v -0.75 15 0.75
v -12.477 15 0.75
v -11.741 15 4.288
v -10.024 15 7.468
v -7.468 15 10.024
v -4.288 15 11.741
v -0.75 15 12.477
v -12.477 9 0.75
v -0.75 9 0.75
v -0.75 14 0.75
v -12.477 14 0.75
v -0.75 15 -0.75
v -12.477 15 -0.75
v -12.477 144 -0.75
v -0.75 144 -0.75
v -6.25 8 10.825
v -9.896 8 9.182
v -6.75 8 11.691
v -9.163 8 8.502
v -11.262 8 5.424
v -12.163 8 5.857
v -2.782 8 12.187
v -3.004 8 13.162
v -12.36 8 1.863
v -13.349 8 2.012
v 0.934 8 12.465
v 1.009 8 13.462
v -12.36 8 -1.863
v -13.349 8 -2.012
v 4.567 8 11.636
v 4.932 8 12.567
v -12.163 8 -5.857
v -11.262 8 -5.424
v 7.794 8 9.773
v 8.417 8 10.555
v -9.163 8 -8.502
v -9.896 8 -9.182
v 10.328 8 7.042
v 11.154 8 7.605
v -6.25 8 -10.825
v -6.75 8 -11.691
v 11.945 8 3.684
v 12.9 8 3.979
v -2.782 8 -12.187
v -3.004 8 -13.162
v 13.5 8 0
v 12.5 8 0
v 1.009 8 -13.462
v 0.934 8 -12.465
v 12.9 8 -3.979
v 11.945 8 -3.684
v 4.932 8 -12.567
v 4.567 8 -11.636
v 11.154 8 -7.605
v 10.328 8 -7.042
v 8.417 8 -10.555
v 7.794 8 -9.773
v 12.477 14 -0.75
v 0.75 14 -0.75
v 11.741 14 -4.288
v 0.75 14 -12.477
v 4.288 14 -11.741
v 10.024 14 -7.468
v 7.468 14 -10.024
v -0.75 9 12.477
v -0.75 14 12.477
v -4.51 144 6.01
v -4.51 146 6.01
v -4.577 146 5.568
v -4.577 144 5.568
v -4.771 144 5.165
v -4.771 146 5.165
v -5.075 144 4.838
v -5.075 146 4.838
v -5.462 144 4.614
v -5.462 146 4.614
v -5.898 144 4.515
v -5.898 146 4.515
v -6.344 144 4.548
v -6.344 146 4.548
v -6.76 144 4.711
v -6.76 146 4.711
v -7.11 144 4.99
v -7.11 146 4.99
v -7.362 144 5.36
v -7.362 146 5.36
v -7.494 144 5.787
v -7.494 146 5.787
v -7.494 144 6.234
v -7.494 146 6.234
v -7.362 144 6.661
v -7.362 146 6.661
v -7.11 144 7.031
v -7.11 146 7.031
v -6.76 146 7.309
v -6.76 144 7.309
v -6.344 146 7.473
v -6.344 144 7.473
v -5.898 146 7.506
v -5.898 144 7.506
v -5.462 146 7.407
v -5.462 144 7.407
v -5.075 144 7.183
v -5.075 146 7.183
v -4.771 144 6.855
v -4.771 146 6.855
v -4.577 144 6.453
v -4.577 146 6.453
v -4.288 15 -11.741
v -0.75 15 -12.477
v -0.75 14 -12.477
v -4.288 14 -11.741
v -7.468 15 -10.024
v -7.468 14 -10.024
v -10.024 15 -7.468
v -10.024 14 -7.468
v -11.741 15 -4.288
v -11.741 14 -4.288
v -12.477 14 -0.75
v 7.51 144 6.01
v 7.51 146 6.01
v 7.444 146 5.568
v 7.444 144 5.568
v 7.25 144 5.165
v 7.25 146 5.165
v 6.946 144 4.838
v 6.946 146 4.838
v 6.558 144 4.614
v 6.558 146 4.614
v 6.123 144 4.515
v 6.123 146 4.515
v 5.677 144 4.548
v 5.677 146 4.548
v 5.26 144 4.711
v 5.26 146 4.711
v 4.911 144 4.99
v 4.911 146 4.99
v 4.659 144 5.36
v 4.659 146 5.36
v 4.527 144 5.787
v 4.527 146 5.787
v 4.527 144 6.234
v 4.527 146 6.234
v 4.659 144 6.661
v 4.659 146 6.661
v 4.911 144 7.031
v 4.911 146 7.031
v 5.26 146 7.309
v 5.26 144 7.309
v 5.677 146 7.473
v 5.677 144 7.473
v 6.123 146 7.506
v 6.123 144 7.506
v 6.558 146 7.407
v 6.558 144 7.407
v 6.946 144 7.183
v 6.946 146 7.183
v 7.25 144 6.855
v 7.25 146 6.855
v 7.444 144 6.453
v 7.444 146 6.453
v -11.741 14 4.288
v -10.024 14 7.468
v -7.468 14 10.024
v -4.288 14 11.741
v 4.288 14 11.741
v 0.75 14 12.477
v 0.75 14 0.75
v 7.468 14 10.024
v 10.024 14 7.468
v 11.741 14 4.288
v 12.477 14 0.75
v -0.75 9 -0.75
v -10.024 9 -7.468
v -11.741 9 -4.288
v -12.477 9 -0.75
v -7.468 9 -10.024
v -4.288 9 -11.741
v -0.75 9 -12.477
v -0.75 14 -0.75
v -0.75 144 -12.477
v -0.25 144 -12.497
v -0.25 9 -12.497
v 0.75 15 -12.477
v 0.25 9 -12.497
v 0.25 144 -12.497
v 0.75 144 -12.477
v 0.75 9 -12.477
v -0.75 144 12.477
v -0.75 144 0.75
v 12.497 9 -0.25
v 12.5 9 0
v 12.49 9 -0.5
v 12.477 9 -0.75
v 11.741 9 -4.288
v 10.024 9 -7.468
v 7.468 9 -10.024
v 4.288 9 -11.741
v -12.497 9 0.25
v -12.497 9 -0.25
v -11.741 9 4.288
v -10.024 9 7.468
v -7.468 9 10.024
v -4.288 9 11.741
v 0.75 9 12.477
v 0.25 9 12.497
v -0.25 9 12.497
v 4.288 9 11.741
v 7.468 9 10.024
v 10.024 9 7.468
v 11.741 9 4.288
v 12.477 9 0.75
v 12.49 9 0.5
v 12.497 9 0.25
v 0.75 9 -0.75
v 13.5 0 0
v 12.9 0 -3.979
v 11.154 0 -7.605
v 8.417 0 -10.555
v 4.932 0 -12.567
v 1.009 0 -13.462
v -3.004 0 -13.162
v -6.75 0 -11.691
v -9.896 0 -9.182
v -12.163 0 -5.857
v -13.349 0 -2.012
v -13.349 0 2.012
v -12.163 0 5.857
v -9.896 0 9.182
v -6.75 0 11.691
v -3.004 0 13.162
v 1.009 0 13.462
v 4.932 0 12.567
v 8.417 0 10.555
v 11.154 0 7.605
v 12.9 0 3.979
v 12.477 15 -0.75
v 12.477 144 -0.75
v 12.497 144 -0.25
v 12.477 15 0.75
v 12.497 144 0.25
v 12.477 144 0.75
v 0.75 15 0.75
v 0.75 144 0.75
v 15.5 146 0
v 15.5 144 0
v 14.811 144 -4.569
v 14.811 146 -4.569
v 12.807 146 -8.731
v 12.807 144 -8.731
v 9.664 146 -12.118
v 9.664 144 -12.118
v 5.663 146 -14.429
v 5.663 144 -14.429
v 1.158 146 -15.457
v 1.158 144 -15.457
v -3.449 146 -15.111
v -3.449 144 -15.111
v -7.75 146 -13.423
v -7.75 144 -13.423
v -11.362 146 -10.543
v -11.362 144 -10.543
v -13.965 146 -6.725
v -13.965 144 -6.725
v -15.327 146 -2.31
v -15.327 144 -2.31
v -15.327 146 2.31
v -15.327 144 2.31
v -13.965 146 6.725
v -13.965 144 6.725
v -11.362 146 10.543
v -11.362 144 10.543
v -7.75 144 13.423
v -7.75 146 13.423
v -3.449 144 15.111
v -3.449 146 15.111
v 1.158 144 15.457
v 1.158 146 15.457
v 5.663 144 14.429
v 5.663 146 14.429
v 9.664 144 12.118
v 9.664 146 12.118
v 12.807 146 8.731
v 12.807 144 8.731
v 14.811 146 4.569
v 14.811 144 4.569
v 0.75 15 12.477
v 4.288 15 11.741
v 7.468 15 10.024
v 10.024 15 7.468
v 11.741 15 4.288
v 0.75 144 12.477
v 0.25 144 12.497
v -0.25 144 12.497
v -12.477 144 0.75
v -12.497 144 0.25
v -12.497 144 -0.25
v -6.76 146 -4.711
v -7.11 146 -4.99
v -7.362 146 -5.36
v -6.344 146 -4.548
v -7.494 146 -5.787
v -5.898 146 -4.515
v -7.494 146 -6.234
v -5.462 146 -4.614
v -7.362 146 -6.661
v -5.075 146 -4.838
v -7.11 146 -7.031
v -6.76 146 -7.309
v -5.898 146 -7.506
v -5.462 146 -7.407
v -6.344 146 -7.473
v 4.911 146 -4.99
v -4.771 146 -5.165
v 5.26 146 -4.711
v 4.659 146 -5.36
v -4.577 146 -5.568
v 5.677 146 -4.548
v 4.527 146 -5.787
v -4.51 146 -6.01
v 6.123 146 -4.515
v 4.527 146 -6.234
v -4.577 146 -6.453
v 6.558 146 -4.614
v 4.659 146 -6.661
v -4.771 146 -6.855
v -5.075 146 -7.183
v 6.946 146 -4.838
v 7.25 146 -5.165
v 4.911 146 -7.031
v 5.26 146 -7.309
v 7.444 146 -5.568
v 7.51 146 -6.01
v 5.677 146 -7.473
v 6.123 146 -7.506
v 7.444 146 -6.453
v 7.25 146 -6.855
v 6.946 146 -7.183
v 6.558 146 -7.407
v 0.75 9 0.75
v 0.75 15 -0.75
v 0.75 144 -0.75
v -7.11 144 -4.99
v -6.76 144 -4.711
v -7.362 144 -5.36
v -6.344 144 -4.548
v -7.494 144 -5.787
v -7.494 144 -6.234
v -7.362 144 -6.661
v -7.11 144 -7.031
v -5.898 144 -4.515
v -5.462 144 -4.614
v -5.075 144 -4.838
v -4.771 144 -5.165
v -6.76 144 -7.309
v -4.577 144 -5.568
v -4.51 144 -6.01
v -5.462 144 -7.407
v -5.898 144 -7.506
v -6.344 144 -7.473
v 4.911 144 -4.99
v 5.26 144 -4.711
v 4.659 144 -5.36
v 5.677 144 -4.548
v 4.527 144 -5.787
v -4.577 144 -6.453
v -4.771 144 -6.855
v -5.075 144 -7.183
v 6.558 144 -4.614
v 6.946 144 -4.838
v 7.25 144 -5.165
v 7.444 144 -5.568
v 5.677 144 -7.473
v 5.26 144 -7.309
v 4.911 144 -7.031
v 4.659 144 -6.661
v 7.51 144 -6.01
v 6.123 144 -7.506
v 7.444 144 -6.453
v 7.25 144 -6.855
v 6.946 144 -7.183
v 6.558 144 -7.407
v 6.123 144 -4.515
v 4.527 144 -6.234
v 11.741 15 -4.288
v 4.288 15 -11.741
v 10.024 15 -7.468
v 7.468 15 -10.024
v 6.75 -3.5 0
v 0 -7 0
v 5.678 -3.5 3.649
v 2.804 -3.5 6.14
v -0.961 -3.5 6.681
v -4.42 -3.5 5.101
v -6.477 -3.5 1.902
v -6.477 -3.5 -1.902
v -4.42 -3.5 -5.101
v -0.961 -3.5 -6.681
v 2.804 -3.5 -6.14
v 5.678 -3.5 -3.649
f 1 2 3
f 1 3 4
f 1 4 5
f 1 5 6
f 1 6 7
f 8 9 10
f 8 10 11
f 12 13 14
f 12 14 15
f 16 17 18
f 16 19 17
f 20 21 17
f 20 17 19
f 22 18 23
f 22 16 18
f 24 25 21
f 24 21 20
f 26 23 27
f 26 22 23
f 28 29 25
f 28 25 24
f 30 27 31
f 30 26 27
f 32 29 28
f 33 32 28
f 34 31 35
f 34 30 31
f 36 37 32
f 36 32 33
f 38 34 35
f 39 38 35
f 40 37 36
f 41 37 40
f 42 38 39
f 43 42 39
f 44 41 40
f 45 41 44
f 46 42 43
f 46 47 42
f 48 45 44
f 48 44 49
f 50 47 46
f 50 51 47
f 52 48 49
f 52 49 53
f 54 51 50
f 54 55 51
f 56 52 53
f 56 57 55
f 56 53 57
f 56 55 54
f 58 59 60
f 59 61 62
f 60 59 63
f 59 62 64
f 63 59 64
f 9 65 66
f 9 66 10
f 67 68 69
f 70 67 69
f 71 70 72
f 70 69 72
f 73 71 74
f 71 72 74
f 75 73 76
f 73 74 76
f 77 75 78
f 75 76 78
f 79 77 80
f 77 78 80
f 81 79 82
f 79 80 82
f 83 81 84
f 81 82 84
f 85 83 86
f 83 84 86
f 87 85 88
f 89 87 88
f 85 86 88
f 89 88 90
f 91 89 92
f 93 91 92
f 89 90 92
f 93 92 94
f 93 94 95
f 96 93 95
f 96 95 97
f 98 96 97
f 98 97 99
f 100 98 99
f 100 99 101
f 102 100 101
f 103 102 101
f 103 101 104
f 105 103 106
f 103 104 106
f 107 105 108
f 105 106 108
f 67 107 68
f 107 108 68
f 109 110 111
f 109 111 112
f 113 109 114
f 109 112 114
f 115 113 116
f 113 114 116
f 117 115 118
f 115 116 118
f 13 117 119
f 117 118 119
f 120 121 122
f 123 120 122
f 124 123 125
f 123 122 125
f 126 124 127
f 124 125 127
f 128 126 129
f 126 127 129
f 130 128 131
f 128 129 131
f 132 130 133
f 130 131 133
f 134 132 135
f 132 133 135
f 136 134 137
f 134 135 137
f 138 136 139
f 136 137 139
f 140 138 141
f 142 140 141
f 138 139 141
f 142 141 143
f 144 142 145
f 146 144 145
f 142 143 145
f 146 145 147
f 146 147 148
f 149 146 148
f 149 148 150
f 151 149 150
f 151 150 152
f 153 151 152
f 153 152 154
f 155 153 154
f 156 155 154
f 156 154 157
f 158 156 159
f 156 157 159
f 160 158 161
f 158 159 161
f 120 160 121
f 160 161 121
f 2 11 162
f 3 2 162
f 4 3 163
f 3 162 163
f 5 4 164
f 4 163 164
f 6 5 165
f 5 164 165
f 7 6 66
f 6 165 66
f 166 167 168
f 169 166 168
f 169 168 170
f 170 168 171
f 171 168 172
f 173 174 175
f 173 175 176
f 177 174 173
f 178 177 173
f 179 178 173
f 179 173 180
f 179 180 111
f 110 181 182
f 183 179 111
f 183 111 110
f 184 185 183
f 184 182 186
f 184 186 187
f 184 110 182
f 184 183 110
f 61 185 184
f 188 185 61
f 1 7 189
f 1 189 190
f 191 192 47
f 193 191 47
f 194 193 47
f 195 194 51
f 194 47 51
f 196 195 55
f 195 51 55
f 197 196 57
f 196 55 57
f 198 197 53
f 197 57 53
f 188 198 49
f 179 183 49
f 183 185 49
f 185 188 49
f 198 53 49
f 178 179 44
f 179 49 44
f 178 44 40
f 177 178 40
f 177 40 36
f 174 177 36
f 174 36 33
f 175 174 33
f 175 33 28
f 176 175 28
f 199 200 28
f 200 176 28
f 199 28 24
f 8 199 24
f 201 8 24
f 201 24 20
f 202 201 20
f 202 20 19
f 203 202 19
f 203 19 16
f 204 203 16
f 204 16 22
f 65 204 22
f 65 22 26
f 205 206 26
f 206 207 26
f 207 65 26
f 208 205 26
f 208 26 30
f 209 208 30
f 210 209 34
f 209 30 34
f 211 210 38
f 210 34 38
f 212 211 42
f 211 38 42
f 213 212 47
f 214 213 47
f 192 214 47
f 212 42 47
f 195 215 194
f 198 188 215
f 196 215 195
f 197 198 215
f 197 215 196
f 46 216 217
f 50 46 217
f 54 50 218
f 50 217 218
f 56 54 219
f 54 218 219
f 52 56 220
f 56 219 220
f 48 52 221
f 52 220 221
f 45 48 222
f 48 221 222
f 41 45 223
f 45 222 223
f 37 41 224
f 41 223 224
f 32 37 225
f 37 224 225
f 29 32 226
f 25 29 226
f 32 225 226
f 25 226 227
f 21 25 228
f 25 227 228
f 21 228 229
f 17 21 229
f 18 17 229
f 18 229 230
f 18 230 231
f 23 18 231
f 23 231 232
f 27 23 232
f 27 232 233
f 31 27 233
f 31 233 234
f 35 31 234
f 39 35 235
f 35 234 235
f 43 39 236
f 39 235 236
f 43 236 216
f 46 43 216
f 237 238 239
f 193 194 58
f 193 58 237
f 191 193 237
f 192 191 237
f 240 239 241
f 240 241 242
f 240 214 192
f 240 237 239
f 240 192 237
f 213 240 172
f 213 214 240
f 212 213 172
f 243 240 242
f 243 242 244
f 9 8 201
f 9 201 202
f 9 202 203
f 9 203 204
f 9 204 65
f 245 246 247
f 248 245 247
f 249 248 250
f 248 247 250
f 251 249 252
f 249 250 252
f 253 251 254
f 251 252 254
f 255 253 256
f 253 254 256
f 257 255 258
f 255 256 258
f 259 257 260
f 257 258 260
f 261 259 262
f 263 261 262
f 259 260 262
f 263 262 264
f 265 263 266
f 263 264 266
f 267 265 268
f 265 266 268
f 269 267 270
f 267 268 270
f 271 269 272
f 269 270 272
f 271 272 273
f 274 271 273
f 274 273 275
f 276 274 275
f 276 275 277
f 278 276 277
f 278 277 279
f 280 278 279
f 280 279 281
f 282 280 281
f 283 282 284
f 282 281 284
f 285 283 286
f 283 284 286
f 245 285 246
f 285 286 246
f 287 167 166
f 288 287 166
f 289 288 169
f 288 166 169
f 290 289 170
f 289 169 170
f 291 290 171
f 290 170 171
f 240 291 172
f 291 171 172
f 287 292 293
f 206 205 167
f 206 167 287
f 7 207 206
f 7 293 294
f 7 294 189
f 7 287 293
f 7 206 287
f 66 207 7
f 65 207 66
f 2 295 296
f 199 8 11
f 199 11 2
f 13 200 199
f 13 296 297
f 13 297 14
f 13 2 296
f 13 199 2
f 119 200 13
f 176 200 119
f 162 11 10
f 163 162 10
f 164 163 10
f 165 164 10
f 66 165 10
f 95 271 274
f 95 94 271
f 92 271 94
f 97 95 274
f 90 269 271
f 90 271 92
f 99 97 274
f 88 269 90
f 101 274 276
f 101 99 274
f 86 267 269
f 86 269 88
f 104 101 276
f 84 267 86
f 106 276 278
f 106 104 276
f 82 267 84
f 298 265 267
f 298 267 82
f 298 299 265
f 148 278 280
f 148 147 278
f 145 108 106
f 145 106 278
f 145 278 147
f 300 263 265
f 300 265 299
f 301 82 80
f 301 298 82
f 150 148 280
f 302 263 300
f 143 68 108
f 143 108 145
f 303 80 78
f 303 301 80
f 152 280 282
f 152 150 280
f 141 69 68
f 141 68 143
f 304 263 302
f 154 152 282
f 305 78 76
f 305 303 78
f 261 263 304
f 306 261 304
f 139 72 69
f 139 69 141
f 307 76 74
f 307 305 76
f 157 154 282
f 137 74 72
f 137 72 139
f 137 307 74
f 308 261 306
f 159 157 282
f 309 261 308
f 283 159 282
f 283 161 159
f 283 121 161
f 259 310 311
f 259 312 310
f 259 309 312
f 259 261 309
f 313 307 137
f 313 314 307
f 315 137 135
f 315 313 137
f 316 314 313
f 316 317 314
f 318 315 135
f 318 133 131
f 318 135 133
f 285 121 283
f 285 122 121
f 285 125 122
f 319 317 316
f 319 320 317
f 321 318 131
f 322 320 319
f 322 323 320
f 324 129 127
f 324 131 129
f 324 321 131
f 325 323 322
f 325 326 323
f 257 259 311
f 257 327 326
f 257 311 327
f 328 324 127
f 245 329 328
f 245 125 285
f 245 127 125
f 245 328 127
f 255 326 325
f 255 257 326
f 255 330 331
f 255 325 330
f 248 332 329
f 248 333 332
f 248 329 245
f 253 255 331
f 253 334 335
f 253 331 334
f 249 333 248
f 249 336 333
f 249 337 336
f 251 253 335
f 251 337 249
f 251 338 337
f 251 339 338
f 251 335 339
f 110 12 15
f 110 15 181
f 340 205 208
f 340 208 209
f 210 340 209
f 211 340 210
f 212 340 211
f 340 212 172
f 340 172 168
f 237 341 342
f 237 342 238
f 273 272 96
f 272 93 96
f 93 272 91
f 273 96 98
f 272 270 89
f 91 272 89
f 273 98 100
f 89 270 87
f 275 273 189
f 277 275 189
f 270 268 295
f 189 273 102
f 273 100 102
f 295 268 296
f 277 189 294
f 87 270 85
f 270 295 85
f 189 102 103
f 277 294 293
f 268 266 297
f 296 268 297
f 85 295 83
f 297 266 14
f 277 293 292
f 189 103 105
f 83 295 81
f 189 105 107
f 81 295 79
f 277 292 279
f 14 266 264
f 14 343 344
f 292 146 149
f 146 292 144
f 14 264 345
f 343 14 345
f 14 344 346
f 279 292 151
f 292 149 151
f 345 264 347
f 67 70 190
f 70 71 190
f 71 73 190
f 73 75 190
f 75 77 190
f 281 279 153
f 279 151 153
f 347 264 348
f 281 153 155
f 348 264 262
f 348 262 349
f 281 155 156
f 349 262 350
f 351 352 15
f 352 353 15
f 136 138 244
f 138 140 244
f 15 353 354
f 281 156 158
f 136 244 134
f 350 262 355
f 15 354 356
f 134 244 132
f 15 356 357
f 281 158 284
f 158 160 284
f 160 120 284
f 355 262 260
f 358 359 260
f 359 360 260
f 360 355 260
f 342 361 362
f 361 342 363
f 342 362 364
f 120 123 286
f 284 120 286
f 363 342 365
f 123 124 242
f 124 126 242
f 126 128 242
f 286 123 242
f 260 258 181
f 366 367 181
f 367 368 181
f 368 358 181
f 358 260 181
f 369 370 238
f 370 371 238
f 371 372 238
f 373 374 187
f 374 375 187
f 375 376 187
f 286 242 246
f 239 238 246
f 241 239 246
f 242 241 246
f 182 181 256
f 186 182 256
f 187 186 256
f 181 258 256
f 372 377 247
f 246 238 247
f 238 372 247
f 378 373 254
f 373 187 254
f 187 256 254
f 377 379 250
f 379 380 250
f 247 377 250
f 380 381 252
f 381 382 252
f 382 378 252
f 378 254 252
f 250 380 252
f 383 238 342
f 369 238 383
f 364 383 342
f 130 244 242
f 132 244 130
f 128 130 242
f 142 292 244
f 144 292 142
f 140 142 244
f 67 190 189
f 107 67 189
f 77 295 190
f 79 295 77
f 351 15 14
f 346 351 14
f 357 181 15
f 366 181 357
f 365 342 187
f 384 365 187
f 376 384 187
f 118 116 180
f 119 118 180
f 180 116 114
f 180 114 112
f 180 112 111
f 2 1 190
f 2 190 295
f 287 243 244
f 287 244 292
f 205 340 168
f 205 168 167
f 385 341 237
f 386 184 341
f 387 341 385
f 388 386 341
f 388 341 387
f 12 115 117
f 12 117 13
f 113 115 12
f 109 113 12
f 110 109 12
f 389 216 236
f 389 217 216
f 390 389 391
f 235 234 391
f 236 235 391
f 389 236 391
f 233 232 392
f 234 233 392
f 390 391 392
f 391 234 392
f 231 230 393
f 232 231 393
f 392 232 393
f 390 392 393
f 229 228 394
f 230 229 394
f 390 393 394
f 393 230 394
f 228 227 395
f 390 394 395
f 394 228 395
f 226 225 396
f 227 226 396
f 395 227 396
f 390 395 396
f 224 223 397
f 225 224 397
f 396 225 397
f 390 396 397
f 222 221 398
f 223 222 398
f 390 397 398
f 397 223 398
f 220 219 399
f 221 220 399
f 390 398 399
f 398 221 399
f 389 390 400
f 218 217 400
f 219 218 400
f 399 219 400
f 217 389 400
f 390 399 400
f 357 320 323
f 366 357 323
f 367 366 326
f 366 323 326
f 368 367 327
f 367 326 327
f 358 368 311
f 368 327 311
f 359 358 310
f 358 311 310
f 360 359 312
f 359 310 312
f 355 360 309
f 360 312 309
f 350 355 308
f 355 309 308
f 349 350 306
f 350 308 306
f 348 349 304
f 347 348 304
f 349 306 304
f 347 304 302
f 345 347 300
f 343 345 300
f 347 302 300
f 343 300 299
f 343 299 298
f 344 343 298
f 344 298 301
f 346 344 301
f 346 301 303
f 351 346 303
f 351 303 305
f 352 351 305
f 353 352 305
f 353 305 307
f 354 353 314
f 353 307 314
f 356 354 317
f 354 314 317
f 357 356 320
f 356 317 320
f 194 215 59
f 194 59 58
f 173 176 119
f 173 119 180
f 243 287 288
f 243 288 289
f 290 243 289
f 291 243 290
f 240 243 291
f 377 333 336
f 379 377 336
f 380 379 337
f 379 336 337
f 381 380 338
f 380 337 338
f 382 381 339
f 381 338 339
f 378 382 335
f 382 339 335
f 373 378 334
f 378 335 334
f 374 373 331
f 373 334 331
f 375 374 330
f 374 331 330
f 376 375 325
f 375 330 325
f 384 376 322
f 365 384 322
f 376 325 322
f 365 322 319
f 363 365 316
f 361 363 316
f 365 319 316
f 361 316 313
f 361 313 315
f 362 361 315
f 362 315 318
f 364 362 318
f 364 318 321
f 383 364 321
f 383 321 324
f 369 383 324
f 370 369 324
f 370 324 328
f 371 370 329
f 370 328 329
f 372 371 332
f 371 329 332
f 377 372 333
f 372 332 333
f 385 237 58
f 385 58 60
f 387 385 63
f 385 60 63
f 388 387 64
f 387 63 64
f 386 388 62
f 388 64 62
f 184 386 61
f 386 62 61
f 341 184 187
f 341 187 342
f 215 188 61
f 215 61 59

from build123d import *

# Parameters (mm, degrees)
SKETCH1_R           = 13.5
BOSS_EXTRUDE1_DEPTH = 8
SKETCH3_R           = 12.5
BOSS_EXTRUDE3_DEPTH = 1
BOSS_EXTRUDE4_DEPTH = 135
SKETCH5_R           = 12.5
BOSS_EXTRUDE5_DEPTH = 1
SKETCH7_R           = 15.5
BOSS_EXTRUDE8_DEPTH = 2
SKETCH9_R           = 1.5
CUT_EXTRUDE1_DEPTH  = 2


with BuildPart() as part:
    # Sketch1 → Boss-Extrude1 (new body)
    with BuildSketch(Plane(origin=(0, 0, 0), x_dir=(1, 0, 0), z_dir=(0, 1, 0))):
        Circle(SKETCH1_R)
    extrude(amount=BOSS_EXTRUDE1_DEPTH)

    # Sketch3 → Boss-Extrude3 (add)
    with BuildSketch(Plane(origin=(0, 8, 0), x_dir=(1, 0, 0), z_dir=(0, 1, 0))):
        Circle(SKETCH3_R)
    extrude(amount=BOSS_EXTRUDE3_DEPTH)

    # Sketch4 → Boss-Extrude4 (add)
    with BuildSketch(Plane(origin=(0, 9, 0), x_dir=(1, 0, 0), z_dir=(0, 1, 0))):
        with BuildLine():
            Line((-0.75, -0.75), (-12.477479713, -0.75))
            ThreePointArc((-12.477479713, -0.75), (-12.5, 0), (-12.477479713, 0.75))
            Line((-12.477479713, 0.75), (-0.75, 0.75))
            Line((-0.75, 0.75), (-0.75, 12.477479713))
            ThreePointArc((-0.75, 12.477479713), (0, 12.5), (0.75, 12.477479713))
            Line((0.75, 12.477479713), (0.75, 0.75))
            Line((0.75, 0.75), (12.477479713, 0.75))
            ThreePointArc((12.477479713, 0.75), (12.5, 0), (12.477479713, -0.75))
            Line((12.477479713, -0.75), (0.75, -0.75))
            Line((0.75, -0.75), (0.75, -12.477479713))
            ThreePointArc((0.75, -12.477479713), (0, -12.5), (-0.75, -12.477479713))
            Line((-0.75, -12.477479713), (-0.75, -0.75))
        make_face()
    extrude(amount=BOSS_EXTRUDE4_DEPTH)

    # Sketch5 → Boss-Extrude5 (add)
    with BuildSketch(Plane(origin=(0, 14, 0), x_dir=(1, 0, 0), z_dir=(0, 1, 0))):
        Circle(SKETCH5_R)
    extrude(amount=BOSS_EXTRUDE5_DEPTH)

    # Sketch8 → Revolve1 (revolve)
    with BuildSketch(Plane.XY):
        Polygon((0, 0), (0, -7), (13.5, 0), align=None)
    revolve(axis=Axis((0, 0, 0), (0, -1, 0)))

    # Sketch7 → Boss-Extrude8 (add)
    with BuildSketch(Plane(origin=(0, 144, 0), x_dir=(1, 0, 0), z_dir=(0, 1, 0))):
        Circle(SKETCH7_R)
    extrude(amount=BOSS_EXTRUDE8_DEPTH)

    # Sketch9 → Cut-Extrude1 (cut)
    with BuildSketch(Plane(origin=(0, 146, 0), x_dir=(1, 0, 0), z_dir=(0, 1, 0))):
        with Locations((-6.01040764, 6.01040764)):
            Circle(SKETCH9_R)
        with Locations((6.01040764, 6.01040764)):
            Circle(SKETCH9_R)
        with Locations((6.01040764, -6.01040764)):
            Circle(SKETCH9_R)
        with Locations((-6.01040764, -6.01040764)):
            Circle(SKETCH9_R)
    extrude(amount=-CUT_EXTRUDE1_DEPTH, mode=Mode.SUBTRACT)


solid = part.part
